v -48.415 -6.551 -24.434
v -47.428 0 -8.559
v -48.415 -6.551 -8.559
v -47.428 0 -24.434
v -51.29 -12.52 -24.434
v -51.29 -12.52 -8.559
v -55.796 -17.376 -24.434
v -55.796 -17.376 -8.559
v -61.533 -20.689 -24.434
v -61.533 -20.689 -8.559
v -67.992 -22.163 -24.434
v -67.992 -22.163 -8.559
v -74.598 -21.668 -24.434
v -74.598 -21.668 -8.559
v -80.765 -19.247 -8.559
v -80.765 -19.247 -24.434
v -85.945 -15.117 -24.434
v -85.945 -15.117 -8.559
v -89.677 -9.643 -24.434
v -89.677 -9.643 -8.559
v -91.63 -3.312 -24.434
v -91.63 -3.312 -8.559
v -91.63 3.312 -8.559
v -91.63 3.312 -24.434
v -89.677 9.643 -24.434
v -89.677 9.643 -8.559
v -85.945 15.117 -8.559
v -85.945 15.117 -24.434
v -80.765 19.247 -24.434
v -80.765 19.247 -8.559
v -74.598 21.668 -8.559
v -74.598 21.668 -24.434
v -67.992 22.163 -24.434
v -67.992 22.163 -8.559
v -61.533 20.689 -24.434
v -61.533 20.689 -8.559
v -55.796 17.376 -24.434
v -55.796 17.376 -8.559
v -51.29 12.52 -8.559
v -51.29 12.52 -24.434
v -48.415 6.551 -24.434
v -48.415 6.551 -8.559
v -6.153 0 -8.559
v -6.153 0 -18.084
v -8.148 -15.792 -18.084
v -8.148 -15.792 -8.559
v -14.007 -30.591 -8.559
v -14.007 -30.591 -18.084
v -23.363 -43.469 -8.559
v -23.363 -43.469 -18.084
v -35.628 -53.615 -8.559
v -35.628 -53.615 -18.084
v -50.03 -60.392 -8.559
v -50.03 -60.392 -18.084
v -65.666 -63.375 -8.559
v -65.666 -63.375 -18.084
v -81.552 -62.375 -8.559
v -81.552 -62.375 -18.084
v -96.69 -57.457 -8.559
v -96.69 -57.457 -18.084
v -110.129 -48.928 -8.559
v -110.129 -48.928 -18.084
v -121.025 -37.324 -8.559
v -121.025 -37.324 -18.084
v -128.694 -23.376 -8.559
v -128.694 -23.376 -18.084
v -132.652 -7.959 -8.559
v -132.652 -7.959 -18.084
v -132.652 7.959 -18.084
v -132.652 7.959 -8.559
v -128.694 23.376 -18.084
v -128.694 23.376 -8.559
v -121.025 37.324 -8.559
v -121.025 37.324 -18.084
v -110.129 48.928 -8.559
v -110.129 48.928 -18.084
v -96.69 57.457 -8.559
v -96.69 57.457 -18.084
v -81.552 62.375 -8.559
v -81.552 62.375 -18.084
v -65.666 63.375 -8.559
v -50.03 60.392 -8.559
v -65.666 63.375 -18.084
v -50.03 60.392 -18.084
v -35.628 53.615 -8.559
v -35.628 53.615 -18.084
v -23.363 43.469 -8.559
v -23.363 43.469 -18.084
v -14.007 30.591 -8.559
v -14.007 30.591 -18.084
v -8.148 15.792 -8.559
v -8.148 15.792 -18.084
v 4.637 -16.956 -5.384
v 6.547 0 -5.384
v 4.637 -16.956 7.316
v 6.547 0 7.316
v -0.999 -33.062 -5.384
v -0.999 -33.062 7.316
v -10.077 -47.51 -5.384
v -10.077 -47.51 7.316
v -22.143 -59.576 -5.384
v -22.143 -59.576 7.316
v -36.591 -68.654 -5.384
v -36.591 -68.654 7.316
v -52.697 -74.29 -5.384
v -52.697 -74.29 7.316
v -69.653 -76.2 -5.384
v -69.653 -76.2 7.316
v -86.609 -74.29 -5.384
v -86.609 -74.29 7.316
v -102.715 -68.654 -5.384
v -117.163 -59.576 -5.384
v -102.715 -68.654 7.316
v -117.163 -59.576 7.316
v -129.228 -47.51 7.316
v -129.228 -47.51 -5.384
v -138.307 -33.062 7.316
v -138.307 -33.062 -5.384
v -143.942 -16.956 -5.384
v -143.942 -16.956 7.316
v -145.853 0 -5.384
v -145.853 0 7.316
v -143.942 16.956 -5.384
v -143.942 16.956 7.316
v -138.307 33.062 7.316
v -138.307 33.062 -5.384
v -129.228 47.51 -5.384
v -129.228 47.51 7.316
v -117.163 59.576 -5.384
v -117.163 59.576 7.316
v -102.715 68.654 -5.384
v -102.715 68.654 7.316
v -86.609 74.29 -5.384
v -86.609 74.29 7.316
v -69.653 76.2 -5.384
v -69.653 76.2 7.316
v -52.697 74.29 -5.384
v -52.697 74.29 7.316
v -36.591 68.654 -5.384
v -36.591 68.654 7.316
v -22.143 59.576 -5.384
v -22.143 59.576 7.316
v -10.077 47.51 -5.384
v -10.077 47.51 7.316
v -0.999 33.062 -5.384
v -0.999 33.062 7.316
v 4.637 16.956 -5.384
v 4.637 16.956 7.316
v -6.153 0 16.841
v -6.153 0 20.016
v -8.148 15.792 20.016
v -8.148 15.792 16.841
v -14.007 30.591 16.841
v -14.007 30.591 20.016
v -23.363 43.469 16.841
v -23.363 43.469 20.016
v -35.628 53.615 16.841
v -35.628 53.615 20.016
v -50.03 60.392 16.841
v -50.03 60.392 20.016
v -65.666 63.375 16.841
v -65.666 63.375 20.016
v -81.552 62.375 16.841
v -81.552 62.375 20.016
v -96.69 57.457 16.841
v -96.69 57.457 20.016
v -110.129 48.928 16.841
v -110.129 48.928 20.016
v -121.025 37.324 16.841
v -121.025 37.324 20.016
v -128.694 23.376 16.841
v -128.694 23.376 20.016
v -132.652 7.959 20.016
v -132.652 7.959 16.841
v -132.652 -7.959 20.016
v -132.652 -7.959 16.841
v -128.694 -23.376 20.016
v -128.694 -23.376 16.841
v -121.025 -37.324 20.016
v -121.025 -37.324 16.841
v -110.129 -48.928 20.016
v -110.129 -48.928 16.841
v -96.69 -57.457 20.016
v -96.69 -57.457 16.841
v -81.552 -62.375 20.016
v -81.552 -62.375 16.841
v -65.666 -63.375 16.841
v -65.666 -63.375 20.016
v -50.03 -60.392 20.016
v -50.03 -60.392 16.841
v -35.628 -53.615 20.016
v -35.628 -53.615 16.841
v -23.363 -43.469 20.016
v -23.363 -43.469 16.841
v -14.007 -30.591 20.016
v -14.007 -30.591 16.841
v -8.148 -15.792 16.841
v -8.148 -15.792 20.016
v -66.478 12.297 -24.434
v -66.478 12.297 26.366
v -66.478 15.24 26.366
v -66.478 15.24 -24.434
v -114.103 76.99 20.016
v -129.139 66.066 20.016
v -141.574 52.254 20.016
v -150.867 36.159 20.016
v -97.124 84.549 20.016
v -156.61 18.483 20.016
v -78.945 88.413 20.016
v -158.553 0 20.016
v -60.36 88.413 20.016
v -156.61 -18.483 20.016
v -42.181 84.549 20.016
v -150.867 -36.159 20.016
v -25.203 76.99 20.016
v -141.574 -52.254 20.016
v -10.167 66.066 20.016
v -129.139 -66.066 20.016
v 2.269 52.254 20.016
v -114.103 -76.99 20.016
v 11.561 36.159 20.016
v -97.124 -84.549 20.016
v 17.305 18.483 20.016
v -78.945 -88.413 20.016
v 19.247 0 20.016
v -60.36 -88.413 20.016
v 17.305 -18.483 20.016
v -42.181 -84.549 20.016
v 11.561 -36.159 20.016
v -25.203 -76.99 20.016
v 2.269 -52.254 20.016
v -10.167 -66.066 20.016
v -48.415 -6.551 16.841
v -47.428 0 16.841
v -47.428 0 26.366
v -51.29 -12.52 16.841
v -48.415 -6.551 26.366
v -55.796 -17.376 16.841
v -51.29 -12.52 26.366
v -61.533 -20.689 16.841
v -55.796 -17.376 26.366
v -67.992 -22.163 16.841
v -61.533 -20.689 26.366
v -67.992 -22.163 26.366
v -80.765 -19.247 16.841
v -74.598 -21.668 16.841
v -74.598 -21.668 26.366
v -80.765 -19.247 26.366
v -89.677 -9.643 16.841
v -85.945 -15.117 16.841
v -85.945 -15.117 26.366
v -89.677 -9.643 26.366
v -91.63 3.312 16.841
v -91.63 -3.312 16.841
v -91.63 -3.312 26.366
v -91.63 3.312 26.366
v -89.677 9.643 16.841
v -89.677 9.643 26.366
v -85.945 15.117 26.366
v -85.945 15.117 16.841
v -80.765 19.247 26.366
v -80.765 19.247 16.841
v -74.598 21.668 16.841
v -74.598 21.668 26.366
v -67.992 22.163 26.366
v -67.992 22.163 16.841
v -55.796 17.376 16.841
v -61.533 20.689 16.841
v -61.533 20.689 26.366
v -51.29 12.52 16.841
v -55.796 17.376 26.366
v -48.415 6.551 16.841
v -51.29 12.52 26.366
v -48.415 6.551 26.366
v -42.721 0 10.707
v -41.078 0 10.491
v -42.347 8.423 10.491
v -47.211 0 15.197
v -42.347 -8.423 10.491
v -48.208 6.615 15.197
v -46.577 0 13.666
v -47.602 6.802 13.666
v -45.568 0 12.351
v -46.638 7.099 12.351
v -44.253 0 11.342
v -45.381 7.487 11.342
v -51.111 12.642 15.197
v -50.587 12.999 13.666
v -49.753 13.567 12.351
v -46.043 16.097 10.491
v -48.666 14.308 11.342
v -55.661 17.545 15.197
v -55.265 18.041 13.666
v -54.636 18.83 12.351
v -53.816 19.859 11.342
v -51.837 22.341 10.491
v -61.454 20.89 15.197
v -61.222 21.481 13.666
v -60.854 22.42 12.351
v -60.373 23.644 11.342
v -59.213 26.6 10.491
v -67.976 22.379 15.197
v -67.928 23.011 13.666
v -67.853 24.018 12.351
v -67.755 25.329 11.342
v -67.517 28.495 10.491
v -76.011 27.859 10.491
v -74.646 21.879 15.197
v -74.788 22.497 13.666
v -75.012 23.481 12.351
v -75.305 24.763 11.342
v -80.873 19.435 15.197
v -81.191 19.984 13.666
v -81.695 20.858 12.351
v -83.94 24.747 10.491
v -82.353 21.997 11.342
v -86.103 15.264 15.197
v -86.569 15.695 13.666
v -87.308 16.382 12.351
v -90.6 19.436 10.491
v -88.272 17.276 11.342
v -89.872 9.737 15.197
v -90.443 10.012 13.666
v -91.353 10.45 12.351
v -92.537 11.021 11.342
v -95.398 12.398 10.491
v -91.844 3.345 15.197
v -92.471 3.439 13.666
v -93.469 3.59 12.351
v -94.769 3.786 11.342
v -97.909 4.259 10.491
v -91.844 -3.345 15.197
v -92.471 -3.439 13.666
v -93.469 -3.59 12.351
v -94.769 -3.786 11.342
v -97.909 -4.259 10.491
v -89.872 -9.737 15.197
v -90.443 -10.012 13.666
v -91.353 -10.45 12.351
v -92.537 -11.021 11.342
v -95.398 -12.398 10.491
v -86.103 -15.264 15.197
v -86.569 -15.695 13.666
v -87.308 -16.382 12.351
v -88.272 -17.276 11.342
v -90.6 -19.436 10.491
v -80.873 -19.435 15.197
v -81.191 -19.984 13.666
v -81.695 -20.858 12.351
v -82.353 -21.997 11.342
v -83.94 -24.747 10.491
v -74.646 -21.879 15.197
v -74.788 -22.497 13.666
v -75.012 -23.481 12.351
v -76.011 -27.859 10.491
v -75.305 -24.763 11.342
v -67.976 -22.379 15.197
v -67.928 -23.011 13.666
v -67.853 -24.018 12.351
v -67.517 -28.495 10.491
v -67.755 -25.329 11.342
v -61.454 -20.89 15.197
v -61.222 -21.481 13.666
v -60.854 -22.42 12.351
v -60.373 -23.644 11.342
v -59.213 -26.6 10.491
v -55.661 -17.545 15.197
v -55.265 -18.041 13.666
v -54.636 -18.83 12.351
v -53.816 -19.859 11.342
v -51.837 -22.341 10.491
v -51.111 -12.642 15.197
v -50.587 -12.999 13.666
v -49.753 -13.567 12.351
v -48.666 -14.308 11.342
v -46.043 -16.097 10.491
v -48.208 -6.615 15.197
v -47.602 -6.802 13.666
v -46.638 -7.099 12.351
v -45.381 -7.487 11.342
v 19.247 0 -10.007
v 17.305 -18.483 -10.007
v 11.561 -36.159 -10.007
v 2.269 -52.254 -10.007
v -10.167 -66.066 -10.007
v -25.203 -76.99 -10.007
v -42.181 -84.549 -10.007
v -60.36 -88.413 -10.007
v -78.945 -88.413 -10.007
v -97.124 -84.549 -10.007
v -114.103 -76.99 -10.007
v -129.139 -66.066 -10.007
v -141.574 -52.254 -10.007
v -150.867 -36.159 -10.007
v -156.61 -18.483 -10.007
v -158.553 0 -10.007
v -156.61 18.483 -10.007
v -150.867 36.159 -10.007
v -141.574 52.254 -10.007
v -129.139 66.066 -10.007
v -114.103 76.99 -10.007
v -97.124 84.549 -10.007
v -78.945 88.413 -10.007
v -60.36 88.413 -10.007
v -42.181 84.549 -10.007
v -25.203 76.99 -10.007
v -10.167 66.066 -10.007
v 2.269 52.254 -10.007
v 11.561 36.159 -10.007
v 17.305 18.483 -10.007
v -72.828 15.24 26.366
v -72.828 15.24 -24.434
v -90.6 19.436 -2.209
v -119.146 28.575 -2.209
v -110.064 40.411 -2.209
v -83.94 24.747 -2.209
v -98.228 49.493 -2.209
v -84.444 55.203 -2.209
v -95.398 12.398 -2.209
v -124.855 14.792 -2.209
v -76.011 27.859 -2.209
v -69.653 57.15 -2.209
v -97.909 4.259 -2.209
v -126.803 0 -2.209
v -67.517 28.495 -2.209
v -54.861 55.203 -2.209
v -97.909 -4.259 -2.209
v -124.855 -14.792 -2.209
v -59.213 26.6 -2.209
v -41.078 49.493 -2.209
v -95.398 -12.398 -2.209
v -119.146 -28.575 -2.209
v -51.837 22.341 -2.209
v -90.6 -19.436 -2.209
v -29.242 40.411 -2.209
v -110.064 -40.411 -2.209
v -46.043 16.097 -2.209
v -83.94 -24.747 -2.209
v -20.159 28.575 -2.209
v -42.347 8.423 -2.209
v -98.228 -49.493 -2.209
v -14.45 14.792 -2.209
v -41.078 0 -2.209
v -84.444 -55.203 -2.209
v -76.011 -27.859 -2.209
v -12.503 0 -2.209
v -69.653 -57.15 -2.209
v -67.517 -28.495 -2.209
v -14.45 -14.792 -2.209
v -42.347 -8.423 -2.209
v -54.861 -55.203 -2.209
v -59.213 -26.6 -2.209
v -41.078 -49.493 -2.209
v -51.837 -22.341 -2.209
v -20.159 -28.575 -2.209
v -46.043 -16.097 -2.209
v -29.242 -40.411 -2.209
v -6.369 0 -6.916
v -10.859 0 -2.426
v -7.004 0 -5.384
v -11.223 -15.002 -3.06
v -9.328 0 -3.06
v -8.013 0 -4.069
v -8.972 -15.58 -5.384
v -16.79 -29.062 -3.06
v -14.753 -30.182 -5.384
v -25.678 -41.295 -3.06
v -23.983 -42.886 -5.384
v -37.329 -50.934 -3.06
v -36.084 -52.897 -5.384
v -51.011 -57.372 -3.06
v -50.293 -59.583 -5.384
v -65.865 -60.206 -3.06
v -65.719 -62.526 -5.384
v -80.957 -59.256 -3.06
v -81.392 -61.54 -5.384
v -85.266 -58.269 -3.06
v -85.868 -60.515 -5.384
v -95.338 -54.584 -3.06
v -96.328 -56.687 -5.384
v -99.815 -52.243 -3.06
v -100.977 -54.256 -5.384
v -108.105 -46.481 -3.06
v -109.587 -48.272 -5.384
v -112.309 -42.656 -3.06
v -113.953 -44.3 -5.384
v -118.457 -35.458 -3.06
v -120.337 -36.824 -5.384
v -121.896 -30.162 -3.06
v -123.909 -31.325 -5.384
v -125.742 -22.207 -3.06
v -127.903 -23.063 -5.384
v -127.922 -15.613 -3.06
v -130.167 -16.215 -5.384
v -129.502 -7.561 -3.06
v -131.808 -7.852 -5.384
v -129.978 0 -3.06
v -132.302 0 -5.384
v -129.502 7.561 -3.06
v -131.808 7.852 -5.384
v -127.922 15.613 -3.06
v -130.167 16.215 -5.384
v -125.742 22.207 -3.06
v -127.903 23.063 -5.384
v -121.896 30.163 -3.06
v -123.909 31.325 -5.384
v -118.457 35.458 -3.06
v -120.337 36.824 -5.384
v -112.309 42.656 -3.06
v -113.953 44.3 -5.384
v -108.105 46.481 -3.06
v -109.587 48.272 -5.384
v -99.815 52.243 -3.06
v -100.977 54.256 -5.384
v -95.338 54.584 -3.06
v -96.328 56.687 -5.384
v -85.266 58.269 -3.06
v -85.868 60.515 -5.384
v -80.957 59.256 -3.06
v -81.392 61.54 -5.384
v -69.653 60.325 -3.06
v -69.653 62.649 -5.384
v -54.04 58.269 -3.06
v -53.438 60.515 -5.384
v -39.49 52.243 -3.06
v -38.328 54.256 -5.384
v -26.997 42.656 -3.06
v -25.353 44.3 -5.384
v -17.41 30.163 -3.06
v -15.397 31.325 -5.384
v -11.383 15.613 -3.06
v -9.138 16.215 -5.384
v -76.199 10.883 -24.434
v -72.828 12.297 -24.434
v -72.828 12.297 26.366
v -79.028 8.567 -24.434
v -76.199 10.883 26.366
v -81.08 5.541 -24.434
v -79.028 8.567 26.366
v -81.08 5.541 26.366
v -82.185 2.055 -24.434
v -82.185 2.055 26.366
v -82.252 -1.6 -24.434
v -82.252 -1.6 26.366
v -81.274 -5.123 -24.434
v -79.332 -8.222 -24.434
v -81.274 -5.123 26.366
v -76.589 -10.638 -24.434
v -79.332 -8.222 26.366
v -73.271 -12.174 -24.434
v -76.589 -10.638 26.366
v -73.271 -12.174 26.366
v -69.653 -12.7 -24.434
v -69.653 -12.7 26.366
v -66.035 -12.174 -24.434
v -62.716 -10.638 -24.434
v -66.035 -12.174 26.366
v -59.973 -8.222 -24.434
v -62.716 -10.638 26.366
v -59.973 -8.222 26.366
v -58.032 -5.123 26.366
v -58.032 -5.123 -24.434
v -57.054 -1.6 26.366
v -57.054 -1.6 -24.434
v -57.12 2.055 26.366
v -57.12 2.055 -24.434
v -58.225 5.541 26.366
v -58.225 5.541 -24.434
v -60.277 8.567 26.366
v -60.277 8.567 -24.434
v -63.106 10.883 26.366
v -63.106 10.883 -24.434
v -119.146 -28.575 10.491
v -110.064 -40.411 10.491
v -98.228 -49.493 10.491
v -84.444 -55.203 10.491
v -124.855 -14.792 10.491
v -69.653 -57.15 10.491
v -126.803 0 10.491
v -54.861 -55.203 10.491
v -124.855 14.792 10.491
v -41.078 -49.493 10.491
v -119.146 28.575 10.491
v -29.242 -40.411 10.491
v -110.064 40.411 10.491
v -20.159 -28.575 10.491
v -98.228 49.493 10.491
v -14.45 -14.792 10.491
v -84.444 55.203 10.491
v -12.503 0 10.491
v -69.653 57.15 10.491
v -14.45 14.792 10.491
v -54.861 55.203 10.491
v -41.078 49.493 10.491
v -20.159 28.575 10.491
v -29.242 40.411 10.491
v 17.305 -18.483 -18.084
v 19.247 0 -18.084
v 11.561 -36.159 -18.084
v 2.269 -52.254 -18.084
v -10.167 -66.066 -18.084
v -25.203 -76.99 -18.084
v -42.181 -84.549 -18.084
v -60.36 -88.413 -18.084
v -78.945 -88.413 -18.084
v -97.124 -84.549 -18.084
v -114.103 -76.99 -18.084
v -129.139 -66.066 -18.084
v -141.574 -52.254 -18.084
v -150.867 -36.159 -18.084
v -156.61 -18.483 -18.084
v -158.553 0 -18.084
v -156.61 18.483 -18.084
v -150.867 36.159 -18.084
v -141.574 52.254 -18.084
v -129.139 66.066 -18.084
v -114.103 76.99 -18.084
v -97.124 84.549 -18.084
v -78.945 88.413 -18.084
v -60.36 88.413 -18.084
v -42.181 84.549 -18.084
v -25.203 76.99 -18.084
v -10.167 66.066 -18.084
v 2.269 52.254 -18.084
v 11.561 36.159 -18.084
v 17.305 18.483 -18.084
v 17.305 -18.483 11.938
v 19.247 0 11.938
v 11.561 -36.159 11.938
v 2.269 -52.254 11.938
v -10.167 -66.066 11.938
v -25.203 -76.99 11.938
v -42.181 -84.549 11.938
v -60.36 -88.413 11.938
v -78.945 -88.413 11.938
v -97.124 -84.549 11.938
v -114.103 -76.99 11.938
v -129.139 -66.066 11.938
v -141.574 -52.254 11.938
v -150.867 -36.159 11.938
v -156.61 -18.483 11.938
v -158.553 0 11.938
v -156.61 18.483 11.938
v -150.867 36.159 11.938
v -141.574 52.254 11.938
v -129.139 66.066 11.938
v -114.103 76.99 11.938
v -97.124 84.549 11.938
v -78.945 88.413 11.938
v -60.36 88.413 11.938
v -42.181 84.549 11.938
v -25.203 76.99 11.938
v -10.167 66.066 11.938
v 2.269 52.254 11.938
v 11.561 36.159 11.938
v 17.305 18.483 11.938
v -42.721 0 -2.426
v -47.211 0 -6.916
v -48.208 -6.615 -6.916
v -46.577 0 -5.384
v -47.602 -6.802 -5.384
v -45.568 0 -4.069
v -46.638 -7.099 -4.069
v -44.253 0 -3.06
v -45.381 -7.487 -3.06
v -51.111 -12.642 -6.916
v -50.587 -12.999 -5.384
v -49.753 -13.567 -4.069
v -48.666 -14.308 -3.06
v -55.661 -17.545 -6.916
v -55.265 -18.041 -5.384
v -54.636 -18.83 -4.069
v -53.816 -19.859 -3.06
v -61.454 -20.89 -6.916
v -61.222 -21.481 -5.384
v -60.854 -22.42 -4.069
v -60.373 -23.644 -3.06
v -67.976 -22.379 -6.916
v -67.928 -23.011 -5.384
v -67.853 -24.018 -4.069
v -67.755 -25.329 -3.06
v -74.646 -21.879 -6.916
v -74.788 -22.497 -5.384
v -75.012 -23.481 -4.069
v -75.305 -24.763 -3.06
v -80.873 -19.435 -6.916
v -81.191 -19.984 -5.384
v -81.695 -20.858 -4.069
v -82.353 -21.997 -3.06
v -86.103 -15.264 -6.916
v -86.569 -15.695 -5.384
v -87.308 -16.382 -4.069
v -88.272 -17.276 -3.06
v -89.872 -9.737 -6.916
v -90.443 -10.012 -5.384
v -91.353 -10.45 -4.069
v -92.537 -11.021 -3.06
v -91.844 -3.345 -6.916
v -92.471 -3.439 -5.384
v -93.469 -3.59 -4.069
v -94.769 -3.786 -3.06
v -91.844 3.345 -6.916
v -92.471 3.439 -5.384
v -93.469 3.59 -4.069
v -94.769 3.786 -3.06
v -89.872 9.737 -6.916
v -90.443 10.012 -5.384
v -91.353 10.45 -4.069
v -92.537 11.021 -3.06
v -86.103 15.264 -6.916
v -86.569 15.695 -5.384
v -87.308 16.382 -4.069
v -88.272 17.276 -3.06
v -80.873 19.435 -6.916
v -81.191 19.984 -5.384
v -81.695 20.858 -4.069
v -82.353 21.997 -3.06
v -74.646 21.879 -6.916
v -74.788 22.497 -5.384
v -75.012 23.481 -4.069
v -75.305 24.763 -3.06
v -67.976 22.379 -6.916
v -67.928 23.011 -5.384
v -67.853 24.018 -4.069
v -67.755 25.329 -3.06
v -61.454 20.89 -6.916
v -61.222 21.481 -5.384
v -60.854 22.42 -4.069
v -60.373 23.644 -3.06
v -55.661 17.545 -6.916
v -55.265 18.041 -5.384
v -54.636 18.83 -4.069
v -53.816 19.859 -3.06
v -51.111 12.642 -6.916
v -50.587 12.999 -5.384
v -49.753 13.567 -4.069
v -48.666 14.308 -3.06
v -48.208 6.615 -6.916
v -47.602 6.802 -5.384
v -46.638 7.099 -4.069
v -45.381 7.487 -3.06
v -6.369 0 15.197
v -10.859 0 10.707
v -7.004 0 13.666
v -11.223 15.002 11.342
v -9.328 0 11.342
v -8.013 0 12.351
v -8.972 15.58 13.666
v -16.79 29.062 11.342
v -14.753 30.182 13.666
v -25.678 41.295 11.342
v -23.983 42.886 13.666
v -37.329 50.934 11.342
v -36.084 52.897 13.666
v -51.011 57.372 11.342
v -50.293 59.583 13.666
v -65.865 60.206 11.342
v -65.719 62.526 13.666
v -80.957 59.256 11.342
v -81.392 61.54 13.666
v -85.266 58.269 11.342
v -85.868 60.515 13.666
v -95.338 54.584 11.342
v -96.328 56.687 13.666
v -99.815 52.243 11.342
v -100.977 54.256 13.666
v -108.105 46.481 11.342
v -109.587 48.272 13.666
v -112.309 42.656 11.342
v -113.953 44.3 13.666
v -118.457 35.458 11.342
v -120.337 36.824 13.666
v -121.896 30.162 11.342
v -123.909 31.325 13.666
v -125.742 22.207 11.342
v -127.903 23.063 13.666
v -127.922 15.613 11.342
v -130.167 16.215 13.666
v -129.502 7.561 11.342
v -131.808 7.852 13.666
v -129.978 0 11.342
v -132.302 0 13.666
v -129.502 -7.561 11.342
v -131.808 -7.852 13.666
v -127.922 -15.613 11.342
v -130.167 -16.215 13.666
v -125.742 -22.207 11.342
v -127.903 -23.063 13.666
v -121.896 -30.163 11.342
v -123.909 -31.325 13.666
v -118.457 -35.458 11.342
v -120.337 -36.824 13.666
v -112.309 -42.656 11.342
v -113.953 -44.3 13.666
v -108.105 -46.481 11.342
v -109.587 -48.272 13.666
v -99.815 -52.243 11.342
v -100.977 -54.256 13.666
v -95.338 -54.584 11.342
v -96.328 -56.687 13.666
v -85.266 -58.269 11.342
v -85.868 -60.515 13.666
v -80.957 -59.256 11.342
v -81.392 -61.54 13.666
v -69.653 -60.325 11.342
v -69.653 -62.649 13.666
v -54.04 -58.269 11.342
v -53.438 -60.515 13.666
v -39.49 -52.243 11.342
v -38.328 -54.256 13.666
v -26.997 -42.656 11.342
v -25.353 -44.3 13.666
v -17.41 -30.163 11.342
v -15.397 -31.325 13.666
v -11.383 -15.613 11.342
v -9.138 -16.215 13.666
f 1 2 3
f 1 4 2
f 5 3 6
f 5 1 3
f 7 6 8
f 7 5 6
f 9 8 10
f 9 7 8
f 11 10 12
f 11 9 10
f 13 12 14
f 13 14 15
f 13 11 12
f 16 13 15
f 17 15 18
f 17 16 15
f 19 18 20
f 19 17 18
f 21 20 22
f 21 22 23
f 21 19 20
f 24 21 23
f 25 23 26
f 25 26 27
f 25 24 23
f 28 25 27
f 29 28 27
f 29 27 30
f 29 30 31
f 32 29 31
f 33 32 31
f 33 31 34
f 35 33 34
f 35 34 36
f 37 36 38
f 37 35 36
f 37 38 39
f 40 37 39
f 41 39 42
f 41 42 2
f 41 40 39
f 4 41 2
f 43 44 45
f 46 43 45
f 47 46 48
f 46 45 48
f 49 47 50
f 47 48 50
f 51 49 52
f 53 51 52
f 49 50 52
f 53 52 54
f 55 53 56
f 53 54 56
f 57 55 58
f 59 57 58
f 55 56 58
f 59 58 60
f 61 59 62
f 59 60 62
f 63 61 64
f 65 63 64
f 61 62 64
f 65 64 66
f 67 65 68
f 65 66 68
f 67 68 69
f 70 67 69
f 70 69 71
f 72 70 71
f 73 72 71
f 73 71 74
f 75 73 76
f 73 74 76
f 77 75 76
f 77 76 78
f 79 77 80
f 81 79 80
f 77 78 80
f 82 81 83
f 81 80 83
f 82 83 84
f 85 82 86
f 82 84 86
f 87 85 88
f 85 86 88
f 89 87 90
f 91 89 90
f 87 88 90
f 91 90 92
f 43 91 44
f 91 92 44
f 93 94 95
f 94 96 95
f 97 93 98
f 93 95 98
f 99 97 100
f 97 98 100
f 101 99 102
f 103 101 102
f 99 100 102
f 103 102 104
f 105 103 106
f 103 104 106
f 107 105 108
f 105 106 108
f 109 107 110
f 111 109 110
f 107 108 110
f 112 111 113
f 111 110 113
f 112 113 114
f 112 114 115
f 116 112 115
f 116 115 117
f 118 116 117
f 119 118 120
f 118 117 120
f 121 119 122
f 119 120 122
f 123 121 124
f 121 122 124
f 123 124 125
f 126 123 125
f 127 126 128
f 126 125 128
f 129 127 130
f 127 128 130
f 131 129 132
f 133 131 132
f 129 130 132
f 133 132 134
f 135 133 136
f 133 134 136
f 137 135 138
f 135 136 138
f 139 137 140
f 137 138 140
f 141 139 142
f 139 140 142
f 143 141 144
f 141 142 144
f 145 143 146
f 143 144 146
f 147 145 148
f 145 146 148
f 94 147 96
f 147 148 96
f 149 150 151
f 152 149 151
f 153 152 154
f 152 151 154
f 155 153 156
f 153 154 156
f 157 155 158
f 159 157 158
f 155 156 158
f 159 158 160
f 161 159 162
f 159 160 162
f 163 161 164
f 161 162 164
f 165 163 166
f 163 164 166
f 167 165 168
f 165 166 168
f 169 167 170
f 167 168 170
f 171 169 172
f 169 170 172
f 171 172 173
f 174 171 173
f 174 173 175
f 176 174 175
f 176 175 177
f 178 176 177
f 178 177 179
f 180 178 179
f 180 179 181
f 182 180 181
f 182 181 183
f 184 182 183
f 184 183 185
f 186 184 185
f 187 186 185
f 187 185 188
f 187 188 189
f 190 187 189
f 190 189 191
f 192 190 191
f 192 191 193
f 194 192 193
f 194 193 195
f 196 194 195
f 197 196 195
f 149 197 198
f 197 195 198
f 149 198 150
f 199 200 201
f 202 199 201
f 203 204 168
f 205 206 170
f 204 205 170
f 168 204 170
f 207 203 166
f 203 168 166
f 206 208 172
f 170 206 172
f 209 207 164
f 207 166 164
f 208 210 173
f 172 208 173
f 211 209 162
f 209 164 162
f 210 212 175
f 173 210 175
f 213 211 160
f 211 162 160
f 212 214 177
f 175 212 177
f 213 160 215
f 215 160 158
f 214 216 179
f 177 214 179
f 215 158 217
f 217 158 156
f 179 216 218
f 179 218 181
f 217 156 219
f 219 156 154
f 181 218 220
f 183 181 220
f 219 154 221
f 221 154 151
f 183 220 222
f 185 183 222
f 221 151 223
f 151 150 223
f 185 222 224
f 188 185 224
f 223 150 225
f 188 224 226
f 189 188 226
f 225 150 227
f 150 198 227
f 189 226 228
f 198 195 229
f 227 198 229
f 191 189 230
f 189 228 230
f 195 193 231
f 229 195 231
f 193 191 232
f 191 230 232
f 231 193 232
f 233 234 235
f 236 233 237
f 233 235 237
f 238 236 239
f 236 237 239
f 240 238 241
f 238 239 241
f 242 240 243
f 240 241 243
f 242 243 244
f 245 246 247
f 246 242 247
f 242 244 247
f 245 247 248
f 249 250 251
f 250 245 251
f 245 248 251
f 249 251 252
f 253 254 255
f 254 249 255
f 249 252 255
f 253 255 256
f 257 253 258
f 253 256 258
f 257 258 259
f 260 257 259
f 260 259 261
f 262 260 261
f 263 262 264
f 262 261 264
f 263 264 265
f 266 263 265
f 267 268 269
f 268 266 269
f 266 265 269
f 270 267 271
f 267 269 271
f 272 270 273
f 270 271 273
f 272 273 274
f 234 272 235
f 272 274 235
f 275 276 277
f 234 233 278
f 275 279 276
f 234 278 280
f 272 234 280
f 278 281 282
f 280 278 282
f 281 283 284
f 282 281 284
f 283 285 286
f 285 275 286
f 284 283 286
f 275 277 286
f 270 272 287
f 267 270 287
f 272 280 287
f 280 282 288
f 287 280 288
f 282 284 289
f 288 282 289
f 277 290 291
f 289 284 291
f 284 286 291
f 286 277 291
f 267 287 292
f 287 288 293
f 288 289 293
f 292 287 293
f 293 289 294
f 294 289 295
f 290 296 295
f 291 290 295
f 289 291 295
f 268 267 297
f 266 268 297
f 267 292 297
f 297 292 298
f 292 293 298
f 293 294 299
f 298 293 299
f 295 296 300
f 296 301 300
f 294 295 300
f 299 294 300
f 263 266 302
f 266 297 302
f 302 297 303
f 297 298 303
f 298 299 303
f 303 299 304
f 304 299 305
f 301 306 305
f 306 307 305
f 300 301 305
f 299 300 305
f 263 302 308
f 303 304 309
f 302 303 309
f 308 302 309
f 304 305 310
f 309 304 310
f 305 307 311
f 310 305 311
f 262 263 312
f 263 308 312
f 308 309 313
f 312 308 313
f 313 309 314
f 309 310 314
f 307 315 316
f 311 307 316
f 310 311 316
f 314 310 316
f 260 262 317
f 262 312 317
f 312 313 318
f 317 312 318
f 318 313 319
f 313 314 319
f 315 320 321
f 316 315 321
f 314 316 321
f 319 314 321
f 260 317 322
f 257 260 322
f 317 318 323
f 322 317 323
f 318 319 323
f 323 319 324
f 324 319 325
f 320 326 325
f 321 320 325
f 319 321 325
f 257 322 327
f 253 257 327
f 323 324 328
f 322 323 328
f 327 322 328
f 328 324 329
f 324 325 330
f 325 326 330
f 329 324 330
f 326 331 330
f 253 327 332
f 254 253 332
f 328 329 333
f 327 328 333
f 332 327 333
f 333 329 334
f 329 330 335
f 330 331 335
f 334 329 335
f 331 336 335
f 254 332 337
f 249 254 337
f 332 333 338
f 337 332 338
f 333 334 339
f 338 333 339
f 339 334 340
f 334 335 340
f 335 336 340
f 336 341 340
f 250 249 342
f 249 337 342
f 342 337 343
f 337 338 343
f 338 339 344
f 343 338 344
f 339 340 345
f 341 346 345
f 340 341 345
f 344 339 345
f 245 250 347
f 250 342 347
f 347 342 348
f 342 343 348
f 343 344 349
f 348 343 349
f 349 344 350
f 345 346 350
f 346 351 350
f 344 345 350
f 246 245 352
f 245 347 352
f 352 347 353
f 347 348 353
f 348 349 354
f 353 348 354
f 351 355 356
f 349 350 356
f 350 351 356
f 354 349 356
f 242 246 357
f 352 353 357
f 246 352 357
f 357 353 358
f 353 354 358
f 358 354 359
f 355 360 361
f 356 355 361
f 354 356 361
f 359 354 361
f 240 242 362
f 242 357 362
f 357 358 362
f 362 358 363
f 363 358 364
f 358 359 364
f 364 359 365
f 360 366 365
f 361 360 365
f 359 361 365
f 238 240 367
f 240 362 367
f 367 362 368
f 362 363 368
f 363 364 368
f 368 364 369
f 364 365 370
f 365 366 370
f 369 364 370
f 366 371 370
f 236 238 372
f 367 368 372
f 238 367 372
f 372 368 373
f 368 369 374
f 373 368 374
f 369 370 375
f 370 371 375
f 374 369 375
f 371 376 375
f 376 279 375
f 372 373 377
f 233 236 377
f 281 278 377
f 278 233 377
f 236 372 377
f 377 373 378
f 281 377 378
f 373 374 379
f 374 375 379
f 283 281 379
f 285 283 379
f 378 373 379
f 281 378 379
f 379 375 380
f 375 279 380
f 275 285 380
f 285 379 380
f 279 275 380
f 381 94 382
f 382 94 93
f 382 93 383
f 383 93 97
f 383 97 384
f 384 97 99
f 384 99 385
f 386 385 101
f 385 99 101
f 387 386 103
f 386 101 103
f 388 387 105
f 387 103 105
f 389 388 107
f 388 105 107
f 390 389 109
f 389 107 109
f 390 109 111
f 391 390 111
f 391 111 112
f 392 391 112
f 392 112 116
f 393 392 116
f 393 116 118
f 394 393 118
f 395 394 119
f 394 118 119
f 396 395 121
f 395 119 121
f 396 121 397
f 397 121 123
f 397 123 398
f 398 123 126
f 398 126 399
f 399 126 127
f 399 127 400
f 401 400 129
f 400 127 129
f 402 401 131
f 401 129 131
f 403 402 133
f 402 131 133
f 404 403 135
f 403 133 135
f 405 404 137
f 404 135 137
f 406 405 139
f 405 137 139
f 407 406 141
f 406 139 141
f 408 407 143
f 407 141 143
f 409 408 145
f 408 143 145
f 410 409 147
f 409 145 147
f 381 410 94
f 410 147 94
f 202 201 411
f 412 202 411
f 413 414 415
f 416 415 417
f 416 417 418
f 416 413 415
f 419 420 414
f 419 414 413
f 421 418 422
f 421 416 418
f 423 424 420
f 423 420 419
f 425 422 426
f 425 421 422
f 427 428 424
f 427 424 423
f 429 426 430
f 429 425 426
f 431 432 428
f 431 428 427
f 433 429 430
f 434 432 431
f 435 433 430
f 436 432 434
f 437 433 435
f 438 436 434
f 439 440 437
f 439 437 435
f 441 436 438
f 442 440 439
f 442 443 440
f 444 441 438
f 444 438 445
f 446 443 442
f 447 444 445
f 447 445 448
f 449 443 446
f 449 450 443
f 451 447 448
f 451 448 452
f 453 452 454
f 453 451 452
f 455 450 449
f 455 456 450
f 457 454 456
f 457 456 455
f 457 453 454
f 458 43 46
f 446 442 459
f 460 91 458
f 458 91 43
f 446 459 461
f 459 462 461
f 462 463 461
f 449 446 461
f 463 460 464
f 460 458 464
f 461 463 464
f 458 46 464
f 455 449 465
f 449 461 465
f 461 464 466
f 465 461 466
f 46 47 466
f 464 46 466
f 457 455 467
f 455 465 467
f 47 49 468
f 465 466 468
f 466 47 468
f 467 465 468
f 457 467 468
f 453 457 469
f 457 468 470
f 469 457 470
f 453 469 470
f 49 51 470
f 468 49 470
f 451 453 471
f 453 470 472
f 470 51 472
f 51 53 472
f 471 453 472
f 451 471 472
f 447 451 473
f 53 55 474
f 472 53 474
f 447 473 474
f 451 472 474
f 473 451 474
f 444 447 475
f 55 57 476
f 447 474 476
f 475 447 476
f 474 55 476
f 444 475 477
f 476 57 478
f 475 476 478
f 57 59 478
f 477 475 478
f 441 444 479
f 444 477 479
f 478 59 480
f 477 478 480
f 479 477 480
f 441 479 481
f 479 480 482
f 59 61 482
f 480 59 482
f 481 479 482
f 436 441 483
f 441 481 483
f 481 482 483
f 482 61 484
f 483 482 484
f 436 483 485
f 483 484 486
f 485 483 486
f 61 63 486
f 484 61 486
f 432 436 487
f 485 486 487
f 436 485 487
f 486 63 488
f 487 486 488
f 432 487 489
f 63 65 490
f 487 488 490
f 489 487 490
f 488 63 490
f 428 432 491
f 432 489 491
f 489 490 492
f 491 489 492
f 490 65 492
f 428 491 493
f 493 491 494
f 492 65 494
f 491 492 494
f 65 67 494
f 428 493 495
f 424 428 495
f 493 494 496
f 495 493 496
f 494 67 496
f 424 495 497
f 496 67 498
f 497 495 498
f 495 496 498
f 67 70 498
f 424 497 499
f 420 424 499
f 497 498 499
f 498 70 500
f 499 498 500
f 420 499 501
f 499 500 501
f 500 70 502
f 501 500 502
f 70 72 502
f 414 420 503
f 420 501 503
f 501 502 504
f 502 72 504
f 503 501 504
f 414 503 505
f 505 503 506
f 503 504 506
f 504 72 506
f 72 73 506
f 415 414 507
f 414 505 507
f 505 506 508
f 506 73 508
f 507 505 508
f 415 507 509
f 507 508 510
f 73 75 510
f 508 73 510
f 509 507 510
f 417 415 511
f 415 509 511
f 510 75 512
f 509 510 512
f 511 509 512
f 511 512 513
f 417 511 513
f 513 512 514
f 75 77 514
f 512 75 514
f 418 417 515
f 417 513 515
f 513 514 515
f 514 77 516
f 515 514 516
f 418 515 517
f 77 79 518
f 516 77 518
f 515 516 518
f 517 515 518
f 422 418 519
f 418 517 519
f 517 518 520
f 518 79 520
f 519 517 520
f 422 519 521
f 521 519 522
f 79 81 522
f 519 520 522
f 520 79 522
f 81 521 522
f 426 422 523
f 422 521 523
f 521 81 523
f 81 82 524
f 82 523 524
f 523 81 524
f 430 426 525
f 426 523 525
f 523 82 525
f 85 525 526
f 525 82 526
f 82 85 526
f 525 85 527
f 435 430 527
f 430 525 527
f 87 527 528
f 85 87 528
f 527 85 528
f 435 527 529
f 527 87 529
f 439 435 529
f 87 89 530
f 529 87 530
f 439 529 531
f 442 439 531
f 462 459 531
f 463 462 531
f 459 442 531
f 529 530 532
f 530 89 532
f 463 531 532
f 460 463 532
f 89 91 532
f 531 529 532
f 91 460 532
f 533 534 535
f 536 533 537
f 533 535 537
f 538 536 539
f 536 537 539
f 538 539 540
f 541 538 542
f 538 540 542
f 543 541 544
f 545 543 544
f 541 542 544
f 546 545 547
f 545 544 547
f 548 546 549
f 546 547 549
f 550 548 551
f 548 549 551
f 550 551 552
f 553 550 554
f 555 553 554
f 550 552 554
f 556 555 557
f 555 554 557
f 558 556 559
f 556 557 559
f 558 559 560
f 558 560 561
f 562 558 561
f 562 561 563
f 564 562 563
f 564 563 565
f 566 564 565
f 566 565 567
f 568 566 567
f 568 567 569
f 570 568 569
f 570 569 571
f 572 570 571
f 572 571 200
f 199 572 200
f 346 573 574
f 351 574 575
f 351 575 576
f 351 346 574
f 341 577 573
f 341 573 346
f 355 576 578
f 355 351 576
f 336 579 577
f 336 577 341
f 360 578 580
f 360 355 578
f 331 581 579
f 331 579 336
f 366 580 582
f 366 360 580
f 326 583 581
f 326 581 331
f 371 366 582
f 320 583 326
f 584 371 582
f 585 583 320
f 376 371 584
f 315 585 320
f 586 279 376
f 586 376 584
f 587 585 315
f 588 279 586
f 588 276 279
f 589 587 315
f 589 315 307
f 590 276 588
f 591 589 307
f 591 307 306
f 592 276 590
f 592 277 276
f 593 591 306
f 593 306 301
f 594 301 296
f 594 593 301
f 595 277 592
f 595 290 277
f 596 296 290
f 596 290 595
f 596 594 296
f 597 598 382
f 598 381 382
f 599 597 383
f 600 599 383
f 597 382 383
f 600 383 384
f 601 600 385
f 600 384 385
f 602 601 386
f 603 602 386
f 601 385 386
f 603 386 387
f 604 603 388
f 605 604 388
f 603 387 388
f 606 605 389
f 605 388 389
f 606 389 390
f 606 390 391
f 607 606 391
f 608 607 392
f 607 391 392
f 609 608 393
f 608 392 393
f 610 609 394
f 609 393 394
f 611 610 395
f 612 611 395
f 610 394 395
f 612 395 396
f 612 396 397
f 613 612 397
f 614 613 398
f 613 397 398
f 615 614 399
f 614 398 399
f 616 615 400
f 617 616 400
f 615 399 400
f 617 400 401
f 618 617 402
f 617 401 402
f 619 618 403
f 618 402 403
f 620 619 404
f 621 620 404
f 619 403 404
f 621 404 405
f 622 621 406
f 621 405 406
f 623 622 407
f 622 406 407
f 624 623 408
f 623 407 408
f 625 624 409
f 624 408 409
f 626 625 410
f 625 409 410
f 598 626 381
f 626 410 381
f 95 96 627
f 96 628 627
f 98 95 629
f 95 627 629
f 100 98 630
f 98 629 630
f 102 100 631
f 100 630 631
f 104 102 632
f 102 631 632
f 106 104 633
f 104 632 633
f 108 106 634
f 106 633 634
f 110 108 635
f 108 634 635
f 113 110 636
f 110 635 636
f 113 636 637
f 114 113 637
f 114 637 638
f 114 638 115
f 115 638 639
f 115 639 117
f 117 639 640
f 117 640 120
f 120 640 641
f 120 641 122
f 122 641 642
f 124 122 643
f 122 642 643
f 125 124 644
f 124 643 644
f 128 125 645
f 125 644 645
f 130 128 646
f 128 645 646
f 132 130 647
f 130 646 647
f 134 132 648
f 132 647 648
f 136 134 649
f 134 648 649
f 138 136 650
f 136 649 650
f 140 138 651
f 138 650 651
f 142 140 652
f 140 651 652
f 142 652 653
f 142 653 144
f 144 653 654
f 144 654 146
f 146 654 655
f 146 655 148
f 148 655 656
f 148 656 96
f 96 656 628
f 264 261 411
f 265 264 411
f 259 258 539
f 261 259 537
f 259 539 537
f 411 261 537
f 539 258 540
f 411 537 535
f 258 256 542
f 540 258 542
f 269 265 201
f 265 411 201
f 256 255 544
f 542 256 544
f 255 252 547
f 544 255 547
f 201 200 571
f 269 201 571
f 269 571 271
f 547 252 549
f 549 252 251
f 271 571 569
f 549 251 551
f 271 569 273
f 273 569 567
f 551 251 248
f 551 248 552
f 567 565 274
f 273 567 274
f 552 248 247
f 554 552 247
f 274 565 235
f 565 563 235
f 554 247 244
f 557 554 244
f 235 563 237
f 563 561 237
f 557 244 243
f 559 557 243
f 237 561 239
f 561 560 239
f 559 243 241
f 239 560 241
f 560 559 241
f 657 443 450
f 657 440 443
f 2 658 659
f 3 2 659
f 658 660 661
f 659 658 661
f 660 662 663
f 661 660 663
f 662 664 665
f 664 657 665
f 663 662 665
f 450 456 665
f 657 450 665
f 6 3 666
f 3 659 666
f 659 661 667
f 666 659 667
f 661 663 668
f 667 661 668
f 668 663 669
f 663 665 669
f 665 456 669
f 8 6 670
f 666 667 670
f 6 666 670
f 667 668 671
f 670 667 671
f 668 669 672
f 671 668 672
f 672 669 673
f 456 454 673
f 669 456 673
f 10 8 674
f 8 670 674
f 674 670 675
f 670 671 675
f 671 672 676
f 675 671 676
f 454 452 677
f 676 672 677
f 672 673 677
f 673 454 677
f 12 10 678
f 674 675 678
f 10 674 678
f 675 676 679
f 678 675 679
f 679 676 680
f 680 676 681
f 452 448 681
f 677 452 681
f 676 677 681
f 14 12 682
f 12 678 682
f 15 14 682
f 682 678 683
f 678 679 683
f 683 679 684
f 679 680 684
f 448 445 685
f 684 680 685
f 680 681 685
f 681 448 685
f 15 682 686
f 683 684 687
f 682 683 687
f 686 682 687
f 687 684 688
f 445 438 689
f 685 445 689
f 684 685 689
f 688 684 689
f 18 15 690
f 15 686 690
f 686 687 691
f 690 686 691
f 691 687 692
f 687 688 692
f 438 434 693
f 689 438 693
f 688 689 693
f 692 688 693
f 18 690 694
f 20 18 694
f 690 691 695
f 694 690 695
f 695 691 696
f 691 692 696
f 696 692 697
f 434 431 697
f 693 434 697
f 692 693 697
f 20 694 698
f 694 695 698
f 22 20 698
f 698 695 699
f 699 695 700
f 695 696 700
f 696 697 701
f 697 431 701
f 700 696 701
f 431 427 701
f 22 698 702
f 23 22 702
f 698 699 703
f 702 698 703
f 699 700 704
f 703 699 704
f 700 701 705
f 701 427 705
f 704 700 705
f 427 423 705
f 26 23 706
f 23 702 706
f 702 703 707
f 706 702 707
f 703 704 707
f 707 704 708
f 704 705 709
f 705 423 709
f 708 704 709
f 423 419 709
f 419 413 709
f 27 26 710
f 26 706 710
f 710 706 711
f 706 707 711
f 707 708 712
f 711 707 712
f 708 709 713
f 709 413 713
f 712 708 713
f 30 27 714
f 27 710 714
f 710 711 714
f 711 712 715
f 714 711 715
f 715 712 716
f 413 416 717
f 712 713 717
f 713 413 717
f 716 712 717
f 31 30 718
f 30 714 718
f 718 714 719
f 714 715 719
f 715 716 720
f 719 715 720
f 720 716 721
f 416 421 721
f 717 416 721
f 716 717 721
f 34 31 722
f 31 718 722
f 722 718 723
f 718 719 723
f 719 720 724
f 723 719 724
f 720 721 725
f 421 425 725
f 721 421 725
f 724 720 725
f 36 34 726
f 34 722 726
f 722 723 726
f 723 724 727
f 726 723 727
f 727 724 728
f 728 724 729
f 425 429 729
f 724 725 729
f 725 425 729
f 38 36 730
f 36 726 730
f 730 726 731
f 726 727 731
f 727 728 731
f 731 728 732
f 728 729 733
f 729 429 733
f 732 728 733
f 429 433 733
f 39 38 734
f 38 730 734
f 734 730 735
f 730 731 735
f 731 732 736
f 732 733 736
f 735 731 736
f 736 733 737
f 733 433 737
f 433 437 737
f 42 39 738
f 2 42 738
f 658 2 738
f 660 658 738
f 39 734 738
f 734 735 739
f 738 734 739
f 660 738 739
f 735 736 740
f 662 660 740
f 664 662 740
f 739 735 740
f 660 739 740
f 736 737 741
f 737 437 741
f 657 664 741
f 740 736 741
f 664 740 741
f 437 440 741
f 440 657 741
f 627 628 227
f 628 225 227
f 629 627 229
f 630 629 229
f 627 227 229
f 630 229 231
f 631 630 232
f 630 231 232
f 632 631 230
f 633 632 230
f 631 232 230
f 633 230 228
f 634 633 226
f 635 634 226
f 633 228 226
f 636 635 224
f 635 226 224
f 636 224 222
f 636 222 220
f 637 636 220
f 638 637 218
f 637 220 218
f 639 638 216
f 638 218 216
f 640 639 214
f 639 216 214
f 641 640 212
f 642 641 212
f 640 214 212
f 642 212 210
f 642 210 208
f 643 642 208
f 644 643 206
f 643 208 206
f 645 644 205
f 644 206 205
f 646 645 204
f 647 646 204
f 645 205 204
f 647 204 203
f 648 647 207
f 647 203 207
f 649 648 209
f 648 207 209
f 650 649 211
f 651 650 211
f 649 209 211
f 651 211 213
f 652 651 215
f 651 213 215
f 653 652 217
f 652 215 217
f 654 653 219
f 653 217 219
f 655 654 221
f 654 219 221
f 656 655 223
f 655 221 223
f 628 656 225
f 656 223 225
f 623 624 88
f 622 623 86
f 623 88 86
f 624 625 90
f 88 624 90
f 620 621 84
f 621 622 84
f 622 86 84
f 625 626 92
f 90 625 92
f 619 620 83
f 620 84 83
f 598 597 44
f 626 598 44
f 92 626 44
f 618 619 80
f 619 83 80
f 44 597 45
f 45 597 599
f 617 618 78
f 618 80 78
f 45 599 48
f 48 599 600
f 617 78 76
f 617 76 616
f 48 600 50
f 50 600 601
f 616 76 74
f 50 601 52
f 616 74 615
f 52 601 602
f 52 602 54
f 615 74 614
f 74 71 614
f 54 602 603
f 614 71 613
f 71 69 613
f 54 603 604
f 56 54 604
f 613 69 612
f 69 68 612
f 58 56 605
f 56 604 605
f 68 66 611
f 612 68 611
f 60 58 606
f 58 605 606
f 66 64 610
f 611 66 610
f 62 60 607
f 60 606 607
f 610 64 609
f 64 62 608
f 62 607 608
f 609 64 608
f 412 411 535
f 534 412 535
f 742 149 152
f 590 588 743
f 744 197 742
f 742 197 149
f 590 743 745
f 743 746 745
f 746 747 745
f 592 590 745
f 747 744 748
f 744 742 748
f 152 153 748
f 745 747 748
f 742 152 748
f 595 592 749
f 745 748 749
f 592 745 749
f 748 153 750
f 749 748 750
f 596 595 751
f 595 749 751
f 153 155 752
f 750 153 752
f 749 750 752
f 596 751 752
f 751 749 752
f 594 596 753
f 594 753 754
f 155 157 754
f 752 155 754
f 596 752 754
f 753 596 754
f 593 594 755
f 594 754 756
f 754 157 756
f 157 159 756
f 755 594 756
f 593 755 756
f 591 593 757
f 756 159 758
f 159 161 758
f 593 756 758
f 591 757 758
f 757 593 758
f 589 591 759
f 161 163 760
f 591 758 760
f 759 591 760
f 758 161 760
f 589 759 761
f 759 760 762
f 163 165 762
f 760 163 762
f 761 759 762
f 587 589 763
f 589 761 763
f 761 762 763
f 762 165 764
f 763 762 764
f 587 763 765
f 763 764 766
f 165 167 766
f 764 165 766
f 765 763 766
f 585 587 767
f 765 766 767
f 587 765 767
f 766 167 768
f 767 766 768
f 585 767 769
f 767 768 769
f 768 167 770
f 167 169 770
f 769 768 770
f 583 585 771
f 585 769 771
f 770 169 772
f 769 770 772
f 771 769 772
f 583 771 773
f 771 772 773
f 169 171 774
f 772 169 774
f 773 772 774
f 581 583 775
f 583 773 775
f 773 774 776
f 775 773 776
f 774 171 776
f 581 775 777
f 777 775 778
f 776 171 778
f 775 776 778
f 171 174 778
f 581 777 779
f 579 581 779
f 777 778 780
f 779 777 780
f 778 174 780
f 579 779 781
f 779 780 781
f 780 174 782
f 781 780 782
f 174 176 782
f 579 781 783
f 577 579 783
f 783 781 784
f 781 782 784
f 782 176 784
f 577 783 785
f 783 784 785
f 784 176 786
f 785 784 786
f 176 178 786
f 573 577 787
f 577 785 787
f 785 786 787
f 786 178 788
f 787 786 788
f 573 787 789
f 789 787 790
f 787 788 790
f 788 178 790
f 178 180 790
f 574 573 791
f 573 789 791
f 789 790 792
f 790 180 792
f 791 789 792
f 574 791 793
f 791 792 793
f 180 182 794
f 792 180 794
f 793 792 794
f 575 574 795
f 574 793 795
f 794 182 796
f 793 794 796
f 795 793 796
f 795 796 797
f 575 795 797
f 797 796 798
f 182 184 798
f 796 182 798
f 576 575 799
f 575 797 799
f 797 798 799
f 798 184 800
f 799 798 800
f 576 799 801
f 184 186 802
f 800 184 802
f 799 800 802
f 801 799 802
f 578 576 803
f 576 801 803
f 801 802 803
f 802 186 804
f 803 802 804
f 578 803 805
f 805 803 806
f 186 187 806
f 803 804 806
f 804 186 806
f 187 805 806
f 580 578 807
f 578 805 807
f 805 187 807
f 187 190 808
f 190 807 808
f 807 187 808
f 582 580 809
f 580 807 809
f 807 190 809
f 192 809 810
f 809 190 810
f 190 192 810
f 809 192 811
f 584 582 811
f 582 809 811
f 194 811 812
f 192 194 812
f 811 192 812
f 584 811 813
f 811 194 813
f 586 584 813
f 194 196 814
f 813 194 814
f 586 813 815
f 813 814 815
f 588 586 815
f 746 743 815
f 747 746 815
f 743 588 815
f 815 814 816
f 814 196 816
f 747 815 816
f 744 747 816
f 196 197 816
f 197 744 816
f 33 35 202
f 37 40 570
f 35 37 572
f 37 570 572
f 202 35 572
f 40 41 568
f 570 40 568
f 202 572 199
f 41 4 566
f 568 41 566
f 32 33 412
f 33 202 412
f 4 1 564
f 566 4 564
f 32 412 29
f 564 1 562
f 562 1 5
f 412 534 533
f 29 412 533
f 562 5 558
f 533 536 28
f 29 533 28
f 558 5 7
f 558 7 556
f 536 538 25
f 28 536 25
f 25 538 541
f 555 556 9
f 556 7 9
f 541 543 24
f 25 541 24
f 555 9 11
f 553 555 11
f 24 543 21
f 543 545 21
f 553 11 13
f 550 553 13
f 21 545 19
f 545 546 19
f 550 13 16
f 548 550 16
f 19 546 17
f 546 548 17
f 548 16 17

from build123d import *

# Parameters (mm, degrees)
F3_DEPTH = 50.801
F2_R     = 63.5
F2_R_2   = 22.225
F4_DEPTH = 15.875
F5_R     = 63.5
F5_R_2   = 22.225
F6_DEPTH = 15.875
F7_R     = 6.35


with BuildPart() as f1:
    # F0 (on Front) → F1 (revolve)
    with BuildSketch(Plane.XZ):
        Polygon((-69.6527920461, 26.3657749056), (-69.6527920461, -24.4342250944), (-47.4277920461, -24.4342250944), (-47.4277920461, -18.0842250944), (19.2472079539, -18.0842250944), (19.2472079539, -10.0066470696), (6.5472079539, -5.3842250944), (6.5472079539, 7.3157749056), (19.2472079539, 11.9381968808), (19.2472079539, 20.0157749056), (-47.4277920461, 20.0157749056), (-47.4277920461, 26.3657749056), align=None)
    revolve(axis=Axis((-69.6527920461, 0, 0.9657749056), (0, 0, -1)))

    # F2 (on face) → F3 (cut, through all)
    with BuildSketch(Plane.XY.offset(26.3657749056)):
        with BuildLine():
            Line((-72.8277920461, 15.24), (-72.8277920461, 12.2967221242))
            ThreePointArc((-72.8277920461, 12.2967221242), (-69.6527920461, -12.7), (-66.4777920461, 12.2967221242))
            Line((-66.4777920461, 12.2967221242), (-66.4777920461, 15.24))
            Line((-66.4777920461, 15.24), (-72.8277920461, 15.24))
        make_face()
    extrude(amount=-F3_DEPTH, mode=Mode.SUBTRACT)

    # F2 (on face) → F4 (cut)
    with BuildSketch(Plane.XY.offset(26.3657749056)):
        with Locations((-69.6527920461, 0)):
            Circle(F2_R)
        with Locations((-69.6527920461, 0)):
            Circle(F2_R_2, mode=Mode.SUBTRACT)
    extrude(amount=-F4_DEPTH, mode=Mode.SUBTRACT)

    # F5 (on face) → F6 (cut)
    with BuildSketch(Plane(origin=(0, 0, -18.0842250944), x_dir=(1, 0, 0), z_dir=(0, 0, -1))):
        with Locations((-69.6527920461, 0)):
            Circle(F5_R)
        with Locations((-69.6527920461, 0)):
            Circle(F5_R_2, mode=Mode.SUBTRACT)
    extrude(amount=-F6_DEPTH, mode=Mode.SUBTRACT)

    # F7
    f7_edges = [f1.edges().sort_by_distance(p)[0] for p in [
        (-133.152792, 0, 10.490775),
        (-91.877792, 0, 10.490775),
        (-133.152792, 0, -2.209225),
        (-91.877792, 0, -2.209225),
    ]]
    fillet(f7_edges, radius=F7_R)


solid = f1.part
